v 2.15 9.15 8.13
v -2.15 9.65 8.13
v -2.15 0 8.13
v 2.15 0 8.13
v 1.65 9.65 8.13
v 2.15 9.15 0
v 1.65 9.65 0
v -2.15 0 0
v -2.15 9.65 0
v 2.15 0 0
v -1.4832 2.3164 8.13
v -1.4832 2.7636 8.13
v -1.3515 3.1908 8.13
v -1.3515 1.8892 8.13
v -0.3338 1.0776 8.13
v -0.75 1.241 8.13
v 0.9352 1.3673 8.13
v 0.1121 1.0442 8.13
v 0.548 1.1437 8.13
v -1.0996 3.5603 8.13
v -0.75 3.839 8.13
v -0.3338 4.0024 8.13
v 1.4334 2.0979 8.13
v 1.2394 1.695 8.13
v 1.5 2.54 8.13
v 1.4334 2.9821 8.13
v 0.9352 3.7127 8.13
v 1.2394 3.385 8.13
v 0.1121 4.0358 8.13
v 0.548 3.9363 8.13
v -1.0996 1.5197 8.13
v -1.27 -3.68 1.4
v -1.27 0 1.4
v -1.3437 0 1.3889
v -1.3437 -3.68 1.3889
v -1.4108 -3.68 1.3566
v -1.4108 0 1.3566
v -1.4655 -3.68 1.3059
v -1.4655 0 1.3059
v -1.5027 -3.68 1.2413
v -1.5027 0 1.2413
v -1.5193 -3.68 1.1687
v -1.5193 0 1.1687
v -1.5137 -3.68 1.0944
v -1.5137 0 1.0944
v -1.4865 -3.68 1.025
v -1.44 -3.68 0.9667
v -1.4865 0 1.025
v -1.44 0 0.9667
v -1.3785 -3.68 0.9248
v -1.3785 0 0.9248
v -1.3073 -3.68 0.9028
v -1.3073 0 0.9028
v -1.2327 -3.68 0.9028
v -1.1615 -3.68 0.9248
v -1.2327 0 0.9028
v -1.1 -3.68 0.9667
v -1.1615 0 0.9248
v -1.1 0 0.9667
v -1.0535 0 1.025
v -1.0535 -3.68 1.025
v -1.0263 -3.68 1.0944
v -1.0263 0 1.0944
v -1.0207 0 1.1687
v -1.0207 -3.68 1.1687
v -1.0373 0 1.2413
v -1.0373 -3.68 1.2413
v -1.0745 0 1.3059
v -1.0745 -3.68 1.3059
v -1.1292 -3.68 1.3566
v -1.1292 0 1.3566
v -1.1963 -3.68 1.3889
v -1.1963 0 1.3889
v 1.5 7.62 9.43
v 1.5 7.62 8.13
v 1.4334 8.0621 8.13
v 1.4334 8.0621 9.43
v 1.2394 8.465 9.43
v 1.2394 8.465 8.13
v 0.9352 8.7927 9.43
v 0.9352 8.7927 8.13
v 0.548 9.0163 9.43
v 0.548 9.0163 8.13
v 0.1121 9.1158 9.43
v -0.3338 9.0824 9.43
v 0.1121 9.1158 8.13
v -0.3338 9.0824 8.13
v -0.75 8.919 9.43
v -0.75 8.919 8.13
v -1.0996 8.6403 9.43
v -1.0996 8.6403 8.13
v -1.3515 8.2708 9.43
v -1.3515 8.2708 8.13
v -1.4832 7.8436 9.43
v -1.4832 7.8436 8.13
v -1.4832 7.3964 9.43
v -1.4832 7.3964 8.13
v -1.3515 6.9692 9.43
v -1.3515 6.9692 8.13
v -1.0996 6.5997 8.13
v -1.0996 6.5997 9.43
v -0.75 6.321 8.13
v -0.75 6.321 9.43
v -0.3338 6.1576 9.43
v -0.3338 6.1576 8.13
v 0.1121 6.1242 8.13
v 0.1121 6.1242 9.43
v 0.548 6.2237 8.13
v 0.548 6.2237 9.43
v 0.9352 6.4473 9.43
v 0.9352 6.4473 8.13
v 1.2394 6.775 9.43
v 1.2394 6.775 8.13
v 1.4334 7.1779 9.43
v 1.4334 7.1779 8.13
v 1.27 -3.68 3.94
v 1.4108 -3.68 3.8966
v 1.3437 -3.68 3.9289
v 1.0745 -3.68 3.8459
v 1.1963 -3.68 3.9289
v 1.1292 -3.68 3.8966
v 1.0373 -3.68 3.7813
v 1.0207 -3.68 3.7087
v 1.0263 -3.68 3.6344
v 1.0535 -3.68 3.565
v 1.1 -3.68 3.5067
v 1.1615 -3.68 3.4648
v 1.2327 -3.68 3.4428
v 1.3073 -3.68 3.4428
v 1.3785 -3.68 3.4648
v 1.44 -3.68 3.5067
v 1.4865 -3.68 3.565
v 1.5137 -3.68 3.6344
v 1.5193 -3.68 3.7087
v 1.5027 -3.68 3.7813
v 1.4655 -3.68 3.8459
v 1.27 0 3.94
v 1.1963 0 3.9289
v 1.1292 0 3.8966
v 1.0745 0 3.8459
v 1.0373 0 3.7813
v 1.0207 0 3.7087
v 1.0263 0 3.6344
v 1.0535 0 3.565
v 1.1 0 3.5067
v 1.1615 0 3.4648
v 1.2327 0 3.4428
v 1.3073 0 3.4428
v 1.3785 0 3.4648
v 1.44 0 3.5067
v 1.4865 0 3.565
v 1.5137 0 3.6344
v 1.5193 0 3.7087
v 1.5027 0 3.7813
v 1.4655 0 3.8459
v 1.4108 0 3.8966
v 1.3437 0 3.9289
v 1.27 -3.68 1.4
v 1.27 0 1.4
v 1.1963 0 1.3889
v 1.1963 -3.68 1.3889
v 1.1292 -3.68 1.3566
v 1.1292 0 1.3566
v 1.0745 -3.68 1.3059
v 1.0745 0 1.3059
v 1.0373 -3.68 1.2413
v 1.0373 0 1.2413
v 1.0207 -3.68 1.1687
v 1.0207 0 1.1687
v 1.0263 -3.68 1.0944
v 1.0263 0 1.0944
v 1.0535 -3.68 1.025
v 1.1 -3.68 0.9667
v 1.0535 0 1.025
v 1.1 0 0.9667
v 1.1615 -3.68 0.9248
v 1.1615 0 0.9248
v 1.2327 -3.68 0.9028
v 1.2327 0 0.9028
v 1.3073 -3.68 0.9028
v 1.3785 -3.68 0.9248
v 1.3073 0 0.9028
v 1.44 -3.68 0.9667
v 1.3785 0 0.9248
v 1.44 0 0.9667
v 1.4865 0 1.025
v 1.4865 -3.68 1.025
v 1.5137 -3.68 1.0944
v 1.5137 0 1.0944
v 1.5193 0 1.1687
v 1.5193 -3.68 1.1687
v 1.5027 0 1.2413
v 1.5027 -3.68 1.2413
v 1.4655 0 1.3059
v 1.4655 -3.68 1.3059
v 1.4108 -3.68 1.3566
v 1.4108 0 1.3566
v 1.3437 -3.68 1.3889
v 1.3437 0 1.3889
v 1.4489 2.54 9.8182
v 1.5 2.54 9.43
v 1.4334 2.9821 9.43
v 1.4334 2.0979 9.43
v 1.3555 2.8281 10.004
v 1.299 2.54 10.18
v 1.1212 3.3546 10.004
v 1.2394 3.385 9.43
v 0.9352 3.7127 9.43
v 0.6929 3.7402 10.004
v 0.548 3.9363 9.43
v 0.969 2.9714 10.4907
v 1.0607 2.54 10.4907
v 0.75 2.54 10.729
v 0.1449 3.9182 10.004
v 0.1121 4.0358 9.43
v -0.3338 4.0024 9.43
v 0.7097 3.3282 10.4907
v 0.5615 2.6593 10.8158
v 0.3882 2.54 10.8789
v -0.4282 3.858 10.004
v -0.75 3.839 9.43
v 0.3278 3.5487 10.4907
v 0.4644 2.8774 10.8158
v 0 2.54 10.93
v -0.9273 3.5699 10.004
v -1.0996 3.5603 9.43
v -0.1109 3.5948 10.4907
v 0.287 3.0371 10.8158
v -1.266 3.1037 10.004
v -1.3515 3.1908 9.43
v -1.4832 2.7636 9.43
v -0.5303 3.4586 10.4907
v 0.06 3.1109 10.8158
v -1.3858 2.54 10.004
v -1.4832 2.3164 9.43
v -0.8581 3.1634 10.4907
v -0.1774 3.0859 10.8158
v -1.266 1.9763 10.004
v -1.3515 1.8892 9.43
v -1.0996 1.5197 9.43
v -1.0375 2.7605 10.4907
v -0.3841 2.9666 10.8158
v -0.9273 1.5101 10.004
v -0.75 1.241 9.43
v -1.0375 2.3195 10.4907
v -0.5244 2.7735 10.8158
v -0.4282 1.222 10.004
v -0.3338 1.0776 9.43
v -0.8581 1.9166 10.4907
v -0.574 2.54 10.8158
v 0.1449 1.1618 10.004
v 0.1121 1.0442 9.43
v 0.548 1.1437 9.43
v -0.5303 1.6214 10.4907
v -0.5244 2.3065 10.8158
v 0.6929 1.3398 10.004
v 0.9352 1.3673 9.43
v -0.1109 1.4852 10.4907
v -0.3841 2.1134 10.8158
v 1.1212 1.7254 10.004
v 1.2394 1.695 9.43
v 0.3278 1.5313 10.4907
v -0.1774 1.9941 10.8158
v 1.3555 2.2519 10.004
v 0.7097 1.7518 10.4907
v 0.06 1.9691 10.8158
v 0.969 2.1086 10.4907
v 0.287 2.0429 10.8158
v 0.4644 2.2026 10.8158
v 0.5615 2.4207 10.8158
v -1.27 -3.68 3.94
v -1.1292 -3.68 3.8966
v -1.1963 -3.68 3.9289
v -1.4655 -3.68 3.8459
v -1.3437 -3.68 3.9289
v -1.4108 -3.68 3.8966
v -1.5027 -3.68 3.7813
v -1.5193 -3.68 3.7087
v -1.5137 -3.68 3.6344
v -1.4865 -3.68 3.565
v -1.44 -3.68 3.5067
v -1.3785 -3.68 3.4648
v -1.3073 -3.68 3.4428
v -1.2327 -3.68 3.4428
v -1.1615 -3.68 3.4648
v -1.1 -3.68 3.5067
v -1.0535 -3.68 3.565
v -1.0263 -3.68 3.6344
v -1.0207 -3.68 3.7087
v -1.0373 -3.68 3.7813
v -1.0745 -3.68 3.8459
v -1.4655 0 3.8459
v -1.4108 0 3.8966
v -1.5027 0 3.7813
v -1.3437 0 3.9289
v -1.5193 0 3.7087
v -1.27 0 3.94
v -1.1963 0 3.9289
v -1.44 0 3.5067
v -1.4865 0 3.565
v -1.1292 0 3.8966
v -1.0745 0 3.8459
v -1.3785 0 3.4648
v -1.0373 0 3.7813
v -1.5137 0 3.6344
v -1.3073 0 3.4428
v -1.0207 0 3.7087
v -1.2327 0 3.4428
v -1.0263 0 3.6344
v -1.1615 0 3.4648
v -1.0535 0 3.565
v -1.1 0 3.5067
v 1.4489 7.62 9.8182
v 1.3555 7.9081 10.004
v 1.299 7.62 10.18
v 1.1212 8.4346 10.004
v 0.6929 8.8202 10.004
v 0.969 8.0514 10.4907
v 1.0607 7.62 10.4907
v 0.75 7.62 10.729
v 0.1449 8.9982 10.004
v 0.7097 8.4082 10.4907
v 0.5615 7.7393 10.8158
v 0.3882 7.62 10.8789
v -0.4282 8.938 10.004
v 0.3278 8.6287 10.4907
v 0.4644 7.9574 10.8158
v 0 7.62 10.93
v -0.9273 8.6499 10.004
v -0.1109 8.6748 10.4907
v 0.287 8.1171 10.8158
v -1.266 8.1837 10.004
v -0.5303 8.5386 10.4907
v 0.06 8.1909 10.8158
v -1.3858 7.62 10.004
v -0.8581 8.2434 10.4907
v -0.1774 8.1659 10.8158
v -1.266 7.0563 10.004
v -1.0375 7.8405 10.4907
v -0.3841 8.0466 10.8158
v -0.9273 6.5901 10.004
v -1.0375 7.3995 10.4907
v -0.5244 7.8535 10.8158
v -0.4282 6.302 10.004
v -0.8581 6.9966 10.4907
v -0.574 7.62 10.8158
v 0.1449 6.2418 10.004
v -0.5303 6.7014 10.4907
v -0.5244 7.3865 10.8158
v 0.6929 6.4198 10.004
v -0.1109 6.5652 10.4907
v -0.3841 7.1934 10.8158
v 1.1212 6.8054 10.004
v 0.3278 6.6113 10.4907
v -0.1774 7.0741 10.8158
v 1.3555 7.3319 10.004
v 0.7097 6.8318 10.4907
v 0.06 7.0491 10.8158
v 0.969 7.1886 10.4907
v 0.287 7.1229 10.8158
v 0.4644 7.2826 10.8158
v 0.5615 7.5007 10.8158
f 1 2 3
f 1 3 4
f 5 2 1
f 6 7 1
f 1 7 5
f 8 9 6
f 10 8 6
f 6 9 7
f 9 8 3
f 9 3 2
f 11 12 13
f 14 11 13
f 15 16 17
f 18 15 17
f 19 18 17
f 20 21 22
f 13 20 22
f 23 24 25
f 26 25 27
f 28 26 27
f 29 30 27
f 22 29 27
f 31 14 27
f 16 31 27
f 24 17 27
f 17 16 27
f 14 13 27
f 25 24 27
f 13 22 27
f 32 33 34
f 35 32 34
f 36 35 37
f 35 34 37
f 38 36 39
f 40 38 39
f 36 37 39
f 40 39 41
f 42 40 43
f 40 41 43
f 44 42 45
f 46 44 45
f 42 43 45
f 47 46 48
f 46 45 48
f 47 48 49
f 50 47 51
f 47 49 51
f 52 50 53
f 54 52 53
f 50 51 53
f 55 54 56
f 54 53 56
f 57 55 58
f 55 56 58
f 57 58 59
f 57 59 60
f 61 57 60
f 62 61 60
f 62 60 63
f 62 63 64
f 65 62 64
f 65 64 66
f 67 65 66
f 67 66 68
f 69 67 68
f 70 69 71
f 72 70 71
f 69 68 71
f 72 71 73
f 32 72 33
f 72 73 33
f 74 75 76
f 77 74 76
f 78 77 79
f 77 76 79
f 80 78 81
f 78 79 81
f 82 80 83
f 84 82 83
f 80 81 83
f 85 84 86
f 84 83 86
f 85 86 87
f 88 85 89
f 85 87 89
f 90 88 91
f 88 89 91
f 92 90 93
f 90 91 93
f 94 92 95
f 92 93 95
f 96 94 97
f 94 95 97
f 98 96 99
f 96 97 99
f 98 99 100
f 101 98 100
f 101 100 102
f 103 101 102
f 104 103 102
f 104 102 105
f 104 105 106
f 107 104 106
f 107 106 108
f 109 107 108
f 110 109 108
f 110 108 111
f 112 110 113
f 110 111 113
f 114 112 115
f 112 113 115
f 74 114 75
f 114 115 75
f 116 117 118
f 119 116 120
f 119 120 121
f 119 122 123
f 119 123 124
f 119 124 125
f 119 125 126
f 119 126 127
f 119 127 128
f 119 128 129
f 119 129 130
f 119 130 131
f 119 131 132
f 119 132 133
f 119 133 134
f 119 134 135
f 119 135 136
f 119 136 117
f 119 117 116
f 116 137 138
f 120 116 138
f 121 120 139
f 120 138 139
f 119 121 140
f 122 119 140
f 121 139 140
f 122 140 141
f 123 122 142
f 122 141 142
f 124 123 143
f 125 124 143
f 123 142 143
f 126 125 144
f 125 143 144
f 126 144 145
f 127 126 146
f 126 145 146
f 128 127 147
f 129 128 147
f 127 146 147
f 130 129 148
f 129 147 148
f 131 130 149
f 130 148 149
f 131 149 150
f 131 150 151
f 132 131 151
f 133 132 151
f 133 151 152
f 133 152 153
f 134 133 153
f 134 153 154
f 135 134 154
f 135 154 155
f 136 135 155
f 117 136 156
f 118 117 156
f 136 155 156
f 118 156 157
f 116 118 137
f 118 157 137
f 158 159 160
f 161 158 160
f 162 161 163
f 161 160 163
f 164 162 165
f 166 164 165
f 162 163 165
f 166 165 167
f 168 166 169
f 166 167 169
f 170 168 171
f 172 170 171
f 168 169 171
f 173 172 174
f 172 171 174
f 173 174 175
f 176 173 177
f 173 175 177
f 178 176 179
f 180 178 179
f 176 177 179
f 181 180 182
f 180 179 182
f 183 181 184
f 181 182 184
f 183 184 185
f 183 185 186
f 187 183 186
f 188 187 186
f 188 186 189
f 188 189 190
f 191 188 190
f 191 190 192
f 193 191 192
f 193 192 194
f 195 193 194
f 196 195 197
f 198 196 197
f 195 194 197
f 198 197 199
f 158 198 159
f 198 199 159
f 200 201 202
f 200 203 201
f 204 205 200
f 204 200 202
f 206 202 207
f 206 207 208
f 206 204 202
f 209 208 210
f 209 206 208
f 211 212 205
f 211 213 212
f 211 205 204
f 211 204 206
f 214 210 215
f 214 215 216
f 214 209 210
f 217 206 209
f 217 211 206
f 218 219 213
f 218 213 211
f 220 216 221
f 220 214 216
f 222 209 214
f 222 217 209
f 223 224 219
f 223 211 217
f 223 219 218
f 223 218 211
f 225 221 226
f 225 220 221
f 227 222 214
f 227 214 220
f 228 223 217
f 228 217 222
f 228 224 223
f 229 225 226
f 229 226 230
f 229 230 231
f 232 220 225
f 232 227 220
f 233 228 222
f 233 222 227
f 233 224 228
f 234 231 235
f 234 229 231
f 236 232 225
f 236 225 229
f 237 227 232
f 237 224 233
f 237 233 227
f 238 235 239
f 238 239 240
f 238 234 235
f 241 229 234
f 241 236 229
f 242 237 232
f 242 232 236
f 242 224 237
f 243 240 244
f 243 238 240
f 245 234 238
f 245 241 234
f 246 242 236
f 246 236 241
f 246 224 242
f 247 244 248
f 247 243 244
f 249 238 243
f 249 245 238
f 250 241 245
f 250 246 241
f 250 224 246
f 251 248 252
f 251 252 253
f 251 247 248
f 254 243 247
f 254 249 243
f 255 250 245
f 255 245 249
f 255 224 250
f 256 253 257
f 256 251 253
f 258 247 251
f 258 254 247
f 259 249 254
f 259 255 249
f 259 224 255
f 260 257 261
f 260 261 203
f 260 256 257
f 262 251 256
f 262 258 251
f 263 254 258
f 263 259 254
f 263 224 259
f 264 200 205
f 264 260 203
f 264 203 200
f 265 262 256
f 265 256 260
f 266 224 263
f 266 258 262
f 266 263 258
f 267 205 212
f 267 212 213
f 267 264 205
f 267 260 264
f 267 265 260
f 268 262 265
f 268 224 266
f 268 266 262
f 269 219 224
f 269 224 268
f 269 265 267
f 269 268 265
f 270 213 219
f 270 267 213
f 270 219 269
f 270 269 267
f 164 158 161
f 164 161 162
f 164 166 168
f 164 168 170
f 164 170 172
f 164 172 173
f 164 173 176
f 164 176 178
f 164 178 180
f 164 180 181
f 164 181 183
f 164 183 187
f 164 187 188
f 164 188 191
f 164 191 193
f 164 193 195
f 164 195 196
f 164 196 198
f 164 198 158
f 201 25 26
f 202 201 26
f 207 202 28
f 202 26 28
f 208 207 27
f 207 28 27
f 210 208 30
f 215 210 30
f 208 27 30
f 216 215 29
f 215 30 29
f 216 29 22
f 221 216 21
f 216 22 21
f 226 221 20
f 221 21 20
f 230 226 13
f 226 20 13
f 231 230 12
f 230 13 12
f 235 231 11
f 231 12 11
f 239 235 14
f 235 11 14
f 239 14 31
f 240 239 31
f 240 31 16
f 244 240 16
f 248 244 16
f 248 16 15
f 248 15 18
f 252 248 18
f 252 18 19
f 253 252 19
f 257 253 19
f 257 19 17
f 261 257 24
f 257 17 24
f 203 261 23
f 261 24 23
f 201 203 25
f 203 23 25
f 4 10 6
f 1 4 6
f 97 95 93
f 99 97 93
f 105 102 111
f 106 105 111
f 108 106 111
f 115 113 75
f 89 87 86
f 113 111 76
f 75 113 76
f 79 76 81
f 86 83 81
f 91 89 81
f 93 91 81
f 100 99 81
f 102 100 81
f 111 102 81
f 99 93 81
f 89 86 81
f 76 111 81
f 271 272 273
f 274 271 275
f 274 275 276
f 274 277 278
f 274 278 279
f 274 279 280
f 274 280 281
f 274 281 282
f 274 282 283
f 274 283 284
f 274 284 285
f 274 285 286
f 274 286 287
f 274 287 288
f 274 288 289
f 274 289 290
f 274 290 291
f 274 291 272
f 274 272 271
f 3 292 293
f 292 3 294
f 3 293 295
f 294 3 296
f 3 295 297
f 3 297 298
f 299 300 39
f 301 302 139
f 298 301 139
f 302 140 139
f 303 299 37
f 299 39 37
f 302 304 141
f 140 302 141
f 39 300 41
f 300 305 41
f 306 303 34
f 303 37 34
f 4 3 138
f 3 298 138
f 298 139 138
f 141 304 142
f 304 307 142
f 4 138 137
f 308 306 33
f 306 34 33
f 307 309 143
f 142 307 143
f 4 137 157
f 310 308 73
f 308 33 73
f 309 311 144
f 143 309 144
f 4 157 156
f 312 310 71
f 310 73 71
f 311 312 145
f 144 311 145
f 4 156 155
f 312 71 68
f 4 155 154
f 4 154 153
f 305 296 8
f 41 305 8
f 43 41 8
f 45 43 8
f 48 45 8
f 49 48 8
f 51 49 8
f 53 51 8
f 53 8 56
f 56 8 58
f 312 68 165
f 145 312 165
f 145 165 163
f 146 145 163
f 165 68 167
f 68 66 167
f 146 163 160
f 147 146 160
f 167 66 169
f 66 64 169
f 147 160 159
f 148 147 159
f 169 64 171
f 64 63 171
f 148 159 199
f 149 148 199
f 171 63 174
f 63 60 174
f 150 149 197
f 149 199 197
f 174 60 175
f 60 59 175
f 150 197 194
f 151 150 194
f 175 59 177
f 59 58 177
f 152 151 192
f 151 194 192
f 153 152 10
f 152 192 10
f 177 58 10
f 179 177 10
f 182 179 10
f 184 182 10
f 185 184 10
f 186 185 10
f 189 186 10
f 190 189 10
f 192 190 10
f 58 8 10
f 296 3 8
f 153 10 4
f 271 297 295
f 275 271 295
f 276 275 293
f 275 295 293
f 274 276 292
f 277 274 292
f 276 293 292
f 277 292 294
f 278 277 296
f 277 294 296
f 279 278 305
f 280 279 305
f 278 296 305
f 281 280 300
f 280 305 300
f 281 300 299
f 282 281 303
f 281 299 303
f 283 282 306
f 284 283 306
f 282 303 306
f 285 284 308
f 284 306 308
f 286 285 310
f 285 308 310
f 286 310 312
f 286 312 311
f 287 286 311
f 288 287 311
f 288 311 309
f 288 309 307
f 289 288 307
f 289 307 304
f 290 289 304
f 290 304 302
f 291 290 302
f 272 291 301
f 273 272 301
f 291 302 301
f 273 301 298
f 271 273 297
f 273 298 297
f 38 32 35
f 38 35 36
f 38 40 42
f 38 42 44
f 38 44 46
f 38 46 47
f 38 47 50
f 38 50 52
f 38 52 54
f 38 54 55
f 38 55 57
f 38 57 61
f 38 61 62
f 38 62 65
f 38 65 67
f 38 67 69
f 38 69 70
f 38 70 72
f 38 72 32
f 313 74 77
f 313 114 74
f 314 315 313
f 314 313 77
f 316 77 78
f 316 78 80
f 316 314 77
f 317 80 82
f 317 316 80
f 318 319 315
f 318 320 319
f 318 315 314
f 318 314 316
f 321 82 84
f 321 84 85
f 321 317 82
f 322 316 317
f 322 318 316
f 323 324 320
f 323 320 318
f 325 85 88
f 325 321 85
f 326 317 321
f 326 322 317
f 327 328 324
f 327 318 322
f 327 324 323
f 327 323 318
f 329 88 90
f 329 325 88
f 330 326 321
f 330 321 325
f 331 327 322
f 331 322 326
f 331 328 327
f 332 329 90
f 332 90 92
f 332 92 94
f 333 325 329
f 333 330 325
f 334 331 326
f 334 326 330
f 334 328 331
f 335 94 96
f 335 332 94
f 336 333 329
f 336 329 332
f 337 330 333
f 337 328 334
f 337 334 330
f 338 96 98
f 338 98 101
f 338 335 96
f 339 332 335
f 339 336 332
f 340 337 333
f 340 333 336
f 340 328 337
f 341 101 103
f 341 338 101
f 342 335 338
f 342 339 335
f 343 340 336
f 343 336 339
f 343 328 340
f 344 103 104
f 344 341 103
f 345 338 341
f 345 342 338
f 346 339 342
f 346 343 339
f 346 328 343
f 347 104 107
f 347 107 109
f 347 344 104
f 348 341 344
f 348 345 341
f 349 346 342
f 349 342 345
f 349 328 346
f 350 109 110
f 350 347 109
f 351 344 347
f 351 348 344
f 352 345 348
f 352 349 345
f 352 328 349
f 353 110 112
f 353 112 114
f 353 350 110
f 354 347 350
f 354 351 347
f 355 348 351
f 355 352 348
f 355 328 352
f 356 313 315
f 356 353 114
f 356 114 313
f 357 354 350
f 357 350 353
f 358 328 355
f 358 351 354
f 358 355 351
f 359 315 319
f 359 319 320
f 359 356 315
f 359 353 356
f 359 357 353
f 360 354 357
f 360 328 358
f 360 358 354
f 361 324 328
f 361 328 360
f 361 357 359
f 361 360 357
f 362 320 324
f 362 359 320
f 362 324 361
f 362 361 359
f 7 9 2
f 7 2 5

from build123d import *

# Parameters (mm, degrees)
ESQUISSE1_W          = 4.3
ESQUISSE1_H          = 9.65
BOSS_EXTRU_1_DEPTH   = 8.13
ESQUISSE2_R          = 1.5
BOSS_EXTRU_2_DEPTH   = 2.8
BOSS_EXTRU_2_2_DEPTH = 2.8
CONG_1_R             = 1.5
CONG_2_R             = 1.5
CHANFREIN1_SIZE      = 0.5
ESQUISSE3_R          = 0.25
BOSS_EXTRU_3_DEPTH   = 3.68


with BuildPart() as part:
    # Esquisse1 → Boss.-Extru.1 (new body)
    with BuildSketch(Plane.XY):
        with Locations((0, 4.825)):
            Rectangle(ESQUISSE1_W, ESQUISSE1_H)
    extrude(amount=BOSS_EXTRU_1_DEPTH)

    # Chanfrein1
    chanfrein1_edges = [part.edges().sort_by_distance(p)[0] for p in [
        (2.15, 9.65, 4.065),
    ]]
    chamfer(chanfrein1_edges, length=CHANFREIN1_SIZE)

    # Esquisse3 → Boss.-Extru.3 (add)
    with BuildSketch(Plane.XZ):
        with Locations(Location((-1.27, 3.69, 0), (0, 0, 90))):
            Circle(ESQUISSE3_R)
        with Locations(Location((1.27, 3.69, 0), (0, 0, 90))):
            Circle(ESQUISSE3_R)
        with Locations(Location((-1.27, 1.15, 0), (0, 0, 90))):
            Circle(ESQUISSE3_R)
        with Locations(Location((1.27, 1.15, 0), (0, 0, 90))):
            Circle(ESQUISSE3_R)
    extrude(amount=BOSS_EXTRU_3_DEPTH)


with BuildPart() as body_2:
    # Esquisse2 → Boss.-Extru.2 (new body)
    with BuildSketch(Plane.XY.offset(8.13)):
        with Locations((0, 7.62)):
            Circle(ESQUISSE2_R)
    extrude(amount=BOSS_EXTRU_2_DEPTH)

    # Congé1
    cong_1_edges = [body_2.edges().sort_by_distance(p)[0] for p in [
        (-1.5, 7.62, 10.93),
    ]]
    fillet(cong_1_edges, radius=CONG_1_R)


with BuildPart() as body_3:
    # Esquisse2 → Boss.-Extru.2 2 (new body)
    with BuildSketch(Plane.XY.offset(8.13)):
        with Locations((0, 2.54)):
            Circle(ESQUISSE2_R)
    extrude(amount=BOSS_EXTRU_2_2_DEPTH)

    # Congé2
    cong_2_edges = [body_3.edges().sort_by_distance(p)[0] for p in [
        (-1.5, 2.54, 10.93),
    ]]
    fillet(cong_2_edges, radius=CONG_2_R)


solid = Compound([part.part, body_2.part, body_3.part])
